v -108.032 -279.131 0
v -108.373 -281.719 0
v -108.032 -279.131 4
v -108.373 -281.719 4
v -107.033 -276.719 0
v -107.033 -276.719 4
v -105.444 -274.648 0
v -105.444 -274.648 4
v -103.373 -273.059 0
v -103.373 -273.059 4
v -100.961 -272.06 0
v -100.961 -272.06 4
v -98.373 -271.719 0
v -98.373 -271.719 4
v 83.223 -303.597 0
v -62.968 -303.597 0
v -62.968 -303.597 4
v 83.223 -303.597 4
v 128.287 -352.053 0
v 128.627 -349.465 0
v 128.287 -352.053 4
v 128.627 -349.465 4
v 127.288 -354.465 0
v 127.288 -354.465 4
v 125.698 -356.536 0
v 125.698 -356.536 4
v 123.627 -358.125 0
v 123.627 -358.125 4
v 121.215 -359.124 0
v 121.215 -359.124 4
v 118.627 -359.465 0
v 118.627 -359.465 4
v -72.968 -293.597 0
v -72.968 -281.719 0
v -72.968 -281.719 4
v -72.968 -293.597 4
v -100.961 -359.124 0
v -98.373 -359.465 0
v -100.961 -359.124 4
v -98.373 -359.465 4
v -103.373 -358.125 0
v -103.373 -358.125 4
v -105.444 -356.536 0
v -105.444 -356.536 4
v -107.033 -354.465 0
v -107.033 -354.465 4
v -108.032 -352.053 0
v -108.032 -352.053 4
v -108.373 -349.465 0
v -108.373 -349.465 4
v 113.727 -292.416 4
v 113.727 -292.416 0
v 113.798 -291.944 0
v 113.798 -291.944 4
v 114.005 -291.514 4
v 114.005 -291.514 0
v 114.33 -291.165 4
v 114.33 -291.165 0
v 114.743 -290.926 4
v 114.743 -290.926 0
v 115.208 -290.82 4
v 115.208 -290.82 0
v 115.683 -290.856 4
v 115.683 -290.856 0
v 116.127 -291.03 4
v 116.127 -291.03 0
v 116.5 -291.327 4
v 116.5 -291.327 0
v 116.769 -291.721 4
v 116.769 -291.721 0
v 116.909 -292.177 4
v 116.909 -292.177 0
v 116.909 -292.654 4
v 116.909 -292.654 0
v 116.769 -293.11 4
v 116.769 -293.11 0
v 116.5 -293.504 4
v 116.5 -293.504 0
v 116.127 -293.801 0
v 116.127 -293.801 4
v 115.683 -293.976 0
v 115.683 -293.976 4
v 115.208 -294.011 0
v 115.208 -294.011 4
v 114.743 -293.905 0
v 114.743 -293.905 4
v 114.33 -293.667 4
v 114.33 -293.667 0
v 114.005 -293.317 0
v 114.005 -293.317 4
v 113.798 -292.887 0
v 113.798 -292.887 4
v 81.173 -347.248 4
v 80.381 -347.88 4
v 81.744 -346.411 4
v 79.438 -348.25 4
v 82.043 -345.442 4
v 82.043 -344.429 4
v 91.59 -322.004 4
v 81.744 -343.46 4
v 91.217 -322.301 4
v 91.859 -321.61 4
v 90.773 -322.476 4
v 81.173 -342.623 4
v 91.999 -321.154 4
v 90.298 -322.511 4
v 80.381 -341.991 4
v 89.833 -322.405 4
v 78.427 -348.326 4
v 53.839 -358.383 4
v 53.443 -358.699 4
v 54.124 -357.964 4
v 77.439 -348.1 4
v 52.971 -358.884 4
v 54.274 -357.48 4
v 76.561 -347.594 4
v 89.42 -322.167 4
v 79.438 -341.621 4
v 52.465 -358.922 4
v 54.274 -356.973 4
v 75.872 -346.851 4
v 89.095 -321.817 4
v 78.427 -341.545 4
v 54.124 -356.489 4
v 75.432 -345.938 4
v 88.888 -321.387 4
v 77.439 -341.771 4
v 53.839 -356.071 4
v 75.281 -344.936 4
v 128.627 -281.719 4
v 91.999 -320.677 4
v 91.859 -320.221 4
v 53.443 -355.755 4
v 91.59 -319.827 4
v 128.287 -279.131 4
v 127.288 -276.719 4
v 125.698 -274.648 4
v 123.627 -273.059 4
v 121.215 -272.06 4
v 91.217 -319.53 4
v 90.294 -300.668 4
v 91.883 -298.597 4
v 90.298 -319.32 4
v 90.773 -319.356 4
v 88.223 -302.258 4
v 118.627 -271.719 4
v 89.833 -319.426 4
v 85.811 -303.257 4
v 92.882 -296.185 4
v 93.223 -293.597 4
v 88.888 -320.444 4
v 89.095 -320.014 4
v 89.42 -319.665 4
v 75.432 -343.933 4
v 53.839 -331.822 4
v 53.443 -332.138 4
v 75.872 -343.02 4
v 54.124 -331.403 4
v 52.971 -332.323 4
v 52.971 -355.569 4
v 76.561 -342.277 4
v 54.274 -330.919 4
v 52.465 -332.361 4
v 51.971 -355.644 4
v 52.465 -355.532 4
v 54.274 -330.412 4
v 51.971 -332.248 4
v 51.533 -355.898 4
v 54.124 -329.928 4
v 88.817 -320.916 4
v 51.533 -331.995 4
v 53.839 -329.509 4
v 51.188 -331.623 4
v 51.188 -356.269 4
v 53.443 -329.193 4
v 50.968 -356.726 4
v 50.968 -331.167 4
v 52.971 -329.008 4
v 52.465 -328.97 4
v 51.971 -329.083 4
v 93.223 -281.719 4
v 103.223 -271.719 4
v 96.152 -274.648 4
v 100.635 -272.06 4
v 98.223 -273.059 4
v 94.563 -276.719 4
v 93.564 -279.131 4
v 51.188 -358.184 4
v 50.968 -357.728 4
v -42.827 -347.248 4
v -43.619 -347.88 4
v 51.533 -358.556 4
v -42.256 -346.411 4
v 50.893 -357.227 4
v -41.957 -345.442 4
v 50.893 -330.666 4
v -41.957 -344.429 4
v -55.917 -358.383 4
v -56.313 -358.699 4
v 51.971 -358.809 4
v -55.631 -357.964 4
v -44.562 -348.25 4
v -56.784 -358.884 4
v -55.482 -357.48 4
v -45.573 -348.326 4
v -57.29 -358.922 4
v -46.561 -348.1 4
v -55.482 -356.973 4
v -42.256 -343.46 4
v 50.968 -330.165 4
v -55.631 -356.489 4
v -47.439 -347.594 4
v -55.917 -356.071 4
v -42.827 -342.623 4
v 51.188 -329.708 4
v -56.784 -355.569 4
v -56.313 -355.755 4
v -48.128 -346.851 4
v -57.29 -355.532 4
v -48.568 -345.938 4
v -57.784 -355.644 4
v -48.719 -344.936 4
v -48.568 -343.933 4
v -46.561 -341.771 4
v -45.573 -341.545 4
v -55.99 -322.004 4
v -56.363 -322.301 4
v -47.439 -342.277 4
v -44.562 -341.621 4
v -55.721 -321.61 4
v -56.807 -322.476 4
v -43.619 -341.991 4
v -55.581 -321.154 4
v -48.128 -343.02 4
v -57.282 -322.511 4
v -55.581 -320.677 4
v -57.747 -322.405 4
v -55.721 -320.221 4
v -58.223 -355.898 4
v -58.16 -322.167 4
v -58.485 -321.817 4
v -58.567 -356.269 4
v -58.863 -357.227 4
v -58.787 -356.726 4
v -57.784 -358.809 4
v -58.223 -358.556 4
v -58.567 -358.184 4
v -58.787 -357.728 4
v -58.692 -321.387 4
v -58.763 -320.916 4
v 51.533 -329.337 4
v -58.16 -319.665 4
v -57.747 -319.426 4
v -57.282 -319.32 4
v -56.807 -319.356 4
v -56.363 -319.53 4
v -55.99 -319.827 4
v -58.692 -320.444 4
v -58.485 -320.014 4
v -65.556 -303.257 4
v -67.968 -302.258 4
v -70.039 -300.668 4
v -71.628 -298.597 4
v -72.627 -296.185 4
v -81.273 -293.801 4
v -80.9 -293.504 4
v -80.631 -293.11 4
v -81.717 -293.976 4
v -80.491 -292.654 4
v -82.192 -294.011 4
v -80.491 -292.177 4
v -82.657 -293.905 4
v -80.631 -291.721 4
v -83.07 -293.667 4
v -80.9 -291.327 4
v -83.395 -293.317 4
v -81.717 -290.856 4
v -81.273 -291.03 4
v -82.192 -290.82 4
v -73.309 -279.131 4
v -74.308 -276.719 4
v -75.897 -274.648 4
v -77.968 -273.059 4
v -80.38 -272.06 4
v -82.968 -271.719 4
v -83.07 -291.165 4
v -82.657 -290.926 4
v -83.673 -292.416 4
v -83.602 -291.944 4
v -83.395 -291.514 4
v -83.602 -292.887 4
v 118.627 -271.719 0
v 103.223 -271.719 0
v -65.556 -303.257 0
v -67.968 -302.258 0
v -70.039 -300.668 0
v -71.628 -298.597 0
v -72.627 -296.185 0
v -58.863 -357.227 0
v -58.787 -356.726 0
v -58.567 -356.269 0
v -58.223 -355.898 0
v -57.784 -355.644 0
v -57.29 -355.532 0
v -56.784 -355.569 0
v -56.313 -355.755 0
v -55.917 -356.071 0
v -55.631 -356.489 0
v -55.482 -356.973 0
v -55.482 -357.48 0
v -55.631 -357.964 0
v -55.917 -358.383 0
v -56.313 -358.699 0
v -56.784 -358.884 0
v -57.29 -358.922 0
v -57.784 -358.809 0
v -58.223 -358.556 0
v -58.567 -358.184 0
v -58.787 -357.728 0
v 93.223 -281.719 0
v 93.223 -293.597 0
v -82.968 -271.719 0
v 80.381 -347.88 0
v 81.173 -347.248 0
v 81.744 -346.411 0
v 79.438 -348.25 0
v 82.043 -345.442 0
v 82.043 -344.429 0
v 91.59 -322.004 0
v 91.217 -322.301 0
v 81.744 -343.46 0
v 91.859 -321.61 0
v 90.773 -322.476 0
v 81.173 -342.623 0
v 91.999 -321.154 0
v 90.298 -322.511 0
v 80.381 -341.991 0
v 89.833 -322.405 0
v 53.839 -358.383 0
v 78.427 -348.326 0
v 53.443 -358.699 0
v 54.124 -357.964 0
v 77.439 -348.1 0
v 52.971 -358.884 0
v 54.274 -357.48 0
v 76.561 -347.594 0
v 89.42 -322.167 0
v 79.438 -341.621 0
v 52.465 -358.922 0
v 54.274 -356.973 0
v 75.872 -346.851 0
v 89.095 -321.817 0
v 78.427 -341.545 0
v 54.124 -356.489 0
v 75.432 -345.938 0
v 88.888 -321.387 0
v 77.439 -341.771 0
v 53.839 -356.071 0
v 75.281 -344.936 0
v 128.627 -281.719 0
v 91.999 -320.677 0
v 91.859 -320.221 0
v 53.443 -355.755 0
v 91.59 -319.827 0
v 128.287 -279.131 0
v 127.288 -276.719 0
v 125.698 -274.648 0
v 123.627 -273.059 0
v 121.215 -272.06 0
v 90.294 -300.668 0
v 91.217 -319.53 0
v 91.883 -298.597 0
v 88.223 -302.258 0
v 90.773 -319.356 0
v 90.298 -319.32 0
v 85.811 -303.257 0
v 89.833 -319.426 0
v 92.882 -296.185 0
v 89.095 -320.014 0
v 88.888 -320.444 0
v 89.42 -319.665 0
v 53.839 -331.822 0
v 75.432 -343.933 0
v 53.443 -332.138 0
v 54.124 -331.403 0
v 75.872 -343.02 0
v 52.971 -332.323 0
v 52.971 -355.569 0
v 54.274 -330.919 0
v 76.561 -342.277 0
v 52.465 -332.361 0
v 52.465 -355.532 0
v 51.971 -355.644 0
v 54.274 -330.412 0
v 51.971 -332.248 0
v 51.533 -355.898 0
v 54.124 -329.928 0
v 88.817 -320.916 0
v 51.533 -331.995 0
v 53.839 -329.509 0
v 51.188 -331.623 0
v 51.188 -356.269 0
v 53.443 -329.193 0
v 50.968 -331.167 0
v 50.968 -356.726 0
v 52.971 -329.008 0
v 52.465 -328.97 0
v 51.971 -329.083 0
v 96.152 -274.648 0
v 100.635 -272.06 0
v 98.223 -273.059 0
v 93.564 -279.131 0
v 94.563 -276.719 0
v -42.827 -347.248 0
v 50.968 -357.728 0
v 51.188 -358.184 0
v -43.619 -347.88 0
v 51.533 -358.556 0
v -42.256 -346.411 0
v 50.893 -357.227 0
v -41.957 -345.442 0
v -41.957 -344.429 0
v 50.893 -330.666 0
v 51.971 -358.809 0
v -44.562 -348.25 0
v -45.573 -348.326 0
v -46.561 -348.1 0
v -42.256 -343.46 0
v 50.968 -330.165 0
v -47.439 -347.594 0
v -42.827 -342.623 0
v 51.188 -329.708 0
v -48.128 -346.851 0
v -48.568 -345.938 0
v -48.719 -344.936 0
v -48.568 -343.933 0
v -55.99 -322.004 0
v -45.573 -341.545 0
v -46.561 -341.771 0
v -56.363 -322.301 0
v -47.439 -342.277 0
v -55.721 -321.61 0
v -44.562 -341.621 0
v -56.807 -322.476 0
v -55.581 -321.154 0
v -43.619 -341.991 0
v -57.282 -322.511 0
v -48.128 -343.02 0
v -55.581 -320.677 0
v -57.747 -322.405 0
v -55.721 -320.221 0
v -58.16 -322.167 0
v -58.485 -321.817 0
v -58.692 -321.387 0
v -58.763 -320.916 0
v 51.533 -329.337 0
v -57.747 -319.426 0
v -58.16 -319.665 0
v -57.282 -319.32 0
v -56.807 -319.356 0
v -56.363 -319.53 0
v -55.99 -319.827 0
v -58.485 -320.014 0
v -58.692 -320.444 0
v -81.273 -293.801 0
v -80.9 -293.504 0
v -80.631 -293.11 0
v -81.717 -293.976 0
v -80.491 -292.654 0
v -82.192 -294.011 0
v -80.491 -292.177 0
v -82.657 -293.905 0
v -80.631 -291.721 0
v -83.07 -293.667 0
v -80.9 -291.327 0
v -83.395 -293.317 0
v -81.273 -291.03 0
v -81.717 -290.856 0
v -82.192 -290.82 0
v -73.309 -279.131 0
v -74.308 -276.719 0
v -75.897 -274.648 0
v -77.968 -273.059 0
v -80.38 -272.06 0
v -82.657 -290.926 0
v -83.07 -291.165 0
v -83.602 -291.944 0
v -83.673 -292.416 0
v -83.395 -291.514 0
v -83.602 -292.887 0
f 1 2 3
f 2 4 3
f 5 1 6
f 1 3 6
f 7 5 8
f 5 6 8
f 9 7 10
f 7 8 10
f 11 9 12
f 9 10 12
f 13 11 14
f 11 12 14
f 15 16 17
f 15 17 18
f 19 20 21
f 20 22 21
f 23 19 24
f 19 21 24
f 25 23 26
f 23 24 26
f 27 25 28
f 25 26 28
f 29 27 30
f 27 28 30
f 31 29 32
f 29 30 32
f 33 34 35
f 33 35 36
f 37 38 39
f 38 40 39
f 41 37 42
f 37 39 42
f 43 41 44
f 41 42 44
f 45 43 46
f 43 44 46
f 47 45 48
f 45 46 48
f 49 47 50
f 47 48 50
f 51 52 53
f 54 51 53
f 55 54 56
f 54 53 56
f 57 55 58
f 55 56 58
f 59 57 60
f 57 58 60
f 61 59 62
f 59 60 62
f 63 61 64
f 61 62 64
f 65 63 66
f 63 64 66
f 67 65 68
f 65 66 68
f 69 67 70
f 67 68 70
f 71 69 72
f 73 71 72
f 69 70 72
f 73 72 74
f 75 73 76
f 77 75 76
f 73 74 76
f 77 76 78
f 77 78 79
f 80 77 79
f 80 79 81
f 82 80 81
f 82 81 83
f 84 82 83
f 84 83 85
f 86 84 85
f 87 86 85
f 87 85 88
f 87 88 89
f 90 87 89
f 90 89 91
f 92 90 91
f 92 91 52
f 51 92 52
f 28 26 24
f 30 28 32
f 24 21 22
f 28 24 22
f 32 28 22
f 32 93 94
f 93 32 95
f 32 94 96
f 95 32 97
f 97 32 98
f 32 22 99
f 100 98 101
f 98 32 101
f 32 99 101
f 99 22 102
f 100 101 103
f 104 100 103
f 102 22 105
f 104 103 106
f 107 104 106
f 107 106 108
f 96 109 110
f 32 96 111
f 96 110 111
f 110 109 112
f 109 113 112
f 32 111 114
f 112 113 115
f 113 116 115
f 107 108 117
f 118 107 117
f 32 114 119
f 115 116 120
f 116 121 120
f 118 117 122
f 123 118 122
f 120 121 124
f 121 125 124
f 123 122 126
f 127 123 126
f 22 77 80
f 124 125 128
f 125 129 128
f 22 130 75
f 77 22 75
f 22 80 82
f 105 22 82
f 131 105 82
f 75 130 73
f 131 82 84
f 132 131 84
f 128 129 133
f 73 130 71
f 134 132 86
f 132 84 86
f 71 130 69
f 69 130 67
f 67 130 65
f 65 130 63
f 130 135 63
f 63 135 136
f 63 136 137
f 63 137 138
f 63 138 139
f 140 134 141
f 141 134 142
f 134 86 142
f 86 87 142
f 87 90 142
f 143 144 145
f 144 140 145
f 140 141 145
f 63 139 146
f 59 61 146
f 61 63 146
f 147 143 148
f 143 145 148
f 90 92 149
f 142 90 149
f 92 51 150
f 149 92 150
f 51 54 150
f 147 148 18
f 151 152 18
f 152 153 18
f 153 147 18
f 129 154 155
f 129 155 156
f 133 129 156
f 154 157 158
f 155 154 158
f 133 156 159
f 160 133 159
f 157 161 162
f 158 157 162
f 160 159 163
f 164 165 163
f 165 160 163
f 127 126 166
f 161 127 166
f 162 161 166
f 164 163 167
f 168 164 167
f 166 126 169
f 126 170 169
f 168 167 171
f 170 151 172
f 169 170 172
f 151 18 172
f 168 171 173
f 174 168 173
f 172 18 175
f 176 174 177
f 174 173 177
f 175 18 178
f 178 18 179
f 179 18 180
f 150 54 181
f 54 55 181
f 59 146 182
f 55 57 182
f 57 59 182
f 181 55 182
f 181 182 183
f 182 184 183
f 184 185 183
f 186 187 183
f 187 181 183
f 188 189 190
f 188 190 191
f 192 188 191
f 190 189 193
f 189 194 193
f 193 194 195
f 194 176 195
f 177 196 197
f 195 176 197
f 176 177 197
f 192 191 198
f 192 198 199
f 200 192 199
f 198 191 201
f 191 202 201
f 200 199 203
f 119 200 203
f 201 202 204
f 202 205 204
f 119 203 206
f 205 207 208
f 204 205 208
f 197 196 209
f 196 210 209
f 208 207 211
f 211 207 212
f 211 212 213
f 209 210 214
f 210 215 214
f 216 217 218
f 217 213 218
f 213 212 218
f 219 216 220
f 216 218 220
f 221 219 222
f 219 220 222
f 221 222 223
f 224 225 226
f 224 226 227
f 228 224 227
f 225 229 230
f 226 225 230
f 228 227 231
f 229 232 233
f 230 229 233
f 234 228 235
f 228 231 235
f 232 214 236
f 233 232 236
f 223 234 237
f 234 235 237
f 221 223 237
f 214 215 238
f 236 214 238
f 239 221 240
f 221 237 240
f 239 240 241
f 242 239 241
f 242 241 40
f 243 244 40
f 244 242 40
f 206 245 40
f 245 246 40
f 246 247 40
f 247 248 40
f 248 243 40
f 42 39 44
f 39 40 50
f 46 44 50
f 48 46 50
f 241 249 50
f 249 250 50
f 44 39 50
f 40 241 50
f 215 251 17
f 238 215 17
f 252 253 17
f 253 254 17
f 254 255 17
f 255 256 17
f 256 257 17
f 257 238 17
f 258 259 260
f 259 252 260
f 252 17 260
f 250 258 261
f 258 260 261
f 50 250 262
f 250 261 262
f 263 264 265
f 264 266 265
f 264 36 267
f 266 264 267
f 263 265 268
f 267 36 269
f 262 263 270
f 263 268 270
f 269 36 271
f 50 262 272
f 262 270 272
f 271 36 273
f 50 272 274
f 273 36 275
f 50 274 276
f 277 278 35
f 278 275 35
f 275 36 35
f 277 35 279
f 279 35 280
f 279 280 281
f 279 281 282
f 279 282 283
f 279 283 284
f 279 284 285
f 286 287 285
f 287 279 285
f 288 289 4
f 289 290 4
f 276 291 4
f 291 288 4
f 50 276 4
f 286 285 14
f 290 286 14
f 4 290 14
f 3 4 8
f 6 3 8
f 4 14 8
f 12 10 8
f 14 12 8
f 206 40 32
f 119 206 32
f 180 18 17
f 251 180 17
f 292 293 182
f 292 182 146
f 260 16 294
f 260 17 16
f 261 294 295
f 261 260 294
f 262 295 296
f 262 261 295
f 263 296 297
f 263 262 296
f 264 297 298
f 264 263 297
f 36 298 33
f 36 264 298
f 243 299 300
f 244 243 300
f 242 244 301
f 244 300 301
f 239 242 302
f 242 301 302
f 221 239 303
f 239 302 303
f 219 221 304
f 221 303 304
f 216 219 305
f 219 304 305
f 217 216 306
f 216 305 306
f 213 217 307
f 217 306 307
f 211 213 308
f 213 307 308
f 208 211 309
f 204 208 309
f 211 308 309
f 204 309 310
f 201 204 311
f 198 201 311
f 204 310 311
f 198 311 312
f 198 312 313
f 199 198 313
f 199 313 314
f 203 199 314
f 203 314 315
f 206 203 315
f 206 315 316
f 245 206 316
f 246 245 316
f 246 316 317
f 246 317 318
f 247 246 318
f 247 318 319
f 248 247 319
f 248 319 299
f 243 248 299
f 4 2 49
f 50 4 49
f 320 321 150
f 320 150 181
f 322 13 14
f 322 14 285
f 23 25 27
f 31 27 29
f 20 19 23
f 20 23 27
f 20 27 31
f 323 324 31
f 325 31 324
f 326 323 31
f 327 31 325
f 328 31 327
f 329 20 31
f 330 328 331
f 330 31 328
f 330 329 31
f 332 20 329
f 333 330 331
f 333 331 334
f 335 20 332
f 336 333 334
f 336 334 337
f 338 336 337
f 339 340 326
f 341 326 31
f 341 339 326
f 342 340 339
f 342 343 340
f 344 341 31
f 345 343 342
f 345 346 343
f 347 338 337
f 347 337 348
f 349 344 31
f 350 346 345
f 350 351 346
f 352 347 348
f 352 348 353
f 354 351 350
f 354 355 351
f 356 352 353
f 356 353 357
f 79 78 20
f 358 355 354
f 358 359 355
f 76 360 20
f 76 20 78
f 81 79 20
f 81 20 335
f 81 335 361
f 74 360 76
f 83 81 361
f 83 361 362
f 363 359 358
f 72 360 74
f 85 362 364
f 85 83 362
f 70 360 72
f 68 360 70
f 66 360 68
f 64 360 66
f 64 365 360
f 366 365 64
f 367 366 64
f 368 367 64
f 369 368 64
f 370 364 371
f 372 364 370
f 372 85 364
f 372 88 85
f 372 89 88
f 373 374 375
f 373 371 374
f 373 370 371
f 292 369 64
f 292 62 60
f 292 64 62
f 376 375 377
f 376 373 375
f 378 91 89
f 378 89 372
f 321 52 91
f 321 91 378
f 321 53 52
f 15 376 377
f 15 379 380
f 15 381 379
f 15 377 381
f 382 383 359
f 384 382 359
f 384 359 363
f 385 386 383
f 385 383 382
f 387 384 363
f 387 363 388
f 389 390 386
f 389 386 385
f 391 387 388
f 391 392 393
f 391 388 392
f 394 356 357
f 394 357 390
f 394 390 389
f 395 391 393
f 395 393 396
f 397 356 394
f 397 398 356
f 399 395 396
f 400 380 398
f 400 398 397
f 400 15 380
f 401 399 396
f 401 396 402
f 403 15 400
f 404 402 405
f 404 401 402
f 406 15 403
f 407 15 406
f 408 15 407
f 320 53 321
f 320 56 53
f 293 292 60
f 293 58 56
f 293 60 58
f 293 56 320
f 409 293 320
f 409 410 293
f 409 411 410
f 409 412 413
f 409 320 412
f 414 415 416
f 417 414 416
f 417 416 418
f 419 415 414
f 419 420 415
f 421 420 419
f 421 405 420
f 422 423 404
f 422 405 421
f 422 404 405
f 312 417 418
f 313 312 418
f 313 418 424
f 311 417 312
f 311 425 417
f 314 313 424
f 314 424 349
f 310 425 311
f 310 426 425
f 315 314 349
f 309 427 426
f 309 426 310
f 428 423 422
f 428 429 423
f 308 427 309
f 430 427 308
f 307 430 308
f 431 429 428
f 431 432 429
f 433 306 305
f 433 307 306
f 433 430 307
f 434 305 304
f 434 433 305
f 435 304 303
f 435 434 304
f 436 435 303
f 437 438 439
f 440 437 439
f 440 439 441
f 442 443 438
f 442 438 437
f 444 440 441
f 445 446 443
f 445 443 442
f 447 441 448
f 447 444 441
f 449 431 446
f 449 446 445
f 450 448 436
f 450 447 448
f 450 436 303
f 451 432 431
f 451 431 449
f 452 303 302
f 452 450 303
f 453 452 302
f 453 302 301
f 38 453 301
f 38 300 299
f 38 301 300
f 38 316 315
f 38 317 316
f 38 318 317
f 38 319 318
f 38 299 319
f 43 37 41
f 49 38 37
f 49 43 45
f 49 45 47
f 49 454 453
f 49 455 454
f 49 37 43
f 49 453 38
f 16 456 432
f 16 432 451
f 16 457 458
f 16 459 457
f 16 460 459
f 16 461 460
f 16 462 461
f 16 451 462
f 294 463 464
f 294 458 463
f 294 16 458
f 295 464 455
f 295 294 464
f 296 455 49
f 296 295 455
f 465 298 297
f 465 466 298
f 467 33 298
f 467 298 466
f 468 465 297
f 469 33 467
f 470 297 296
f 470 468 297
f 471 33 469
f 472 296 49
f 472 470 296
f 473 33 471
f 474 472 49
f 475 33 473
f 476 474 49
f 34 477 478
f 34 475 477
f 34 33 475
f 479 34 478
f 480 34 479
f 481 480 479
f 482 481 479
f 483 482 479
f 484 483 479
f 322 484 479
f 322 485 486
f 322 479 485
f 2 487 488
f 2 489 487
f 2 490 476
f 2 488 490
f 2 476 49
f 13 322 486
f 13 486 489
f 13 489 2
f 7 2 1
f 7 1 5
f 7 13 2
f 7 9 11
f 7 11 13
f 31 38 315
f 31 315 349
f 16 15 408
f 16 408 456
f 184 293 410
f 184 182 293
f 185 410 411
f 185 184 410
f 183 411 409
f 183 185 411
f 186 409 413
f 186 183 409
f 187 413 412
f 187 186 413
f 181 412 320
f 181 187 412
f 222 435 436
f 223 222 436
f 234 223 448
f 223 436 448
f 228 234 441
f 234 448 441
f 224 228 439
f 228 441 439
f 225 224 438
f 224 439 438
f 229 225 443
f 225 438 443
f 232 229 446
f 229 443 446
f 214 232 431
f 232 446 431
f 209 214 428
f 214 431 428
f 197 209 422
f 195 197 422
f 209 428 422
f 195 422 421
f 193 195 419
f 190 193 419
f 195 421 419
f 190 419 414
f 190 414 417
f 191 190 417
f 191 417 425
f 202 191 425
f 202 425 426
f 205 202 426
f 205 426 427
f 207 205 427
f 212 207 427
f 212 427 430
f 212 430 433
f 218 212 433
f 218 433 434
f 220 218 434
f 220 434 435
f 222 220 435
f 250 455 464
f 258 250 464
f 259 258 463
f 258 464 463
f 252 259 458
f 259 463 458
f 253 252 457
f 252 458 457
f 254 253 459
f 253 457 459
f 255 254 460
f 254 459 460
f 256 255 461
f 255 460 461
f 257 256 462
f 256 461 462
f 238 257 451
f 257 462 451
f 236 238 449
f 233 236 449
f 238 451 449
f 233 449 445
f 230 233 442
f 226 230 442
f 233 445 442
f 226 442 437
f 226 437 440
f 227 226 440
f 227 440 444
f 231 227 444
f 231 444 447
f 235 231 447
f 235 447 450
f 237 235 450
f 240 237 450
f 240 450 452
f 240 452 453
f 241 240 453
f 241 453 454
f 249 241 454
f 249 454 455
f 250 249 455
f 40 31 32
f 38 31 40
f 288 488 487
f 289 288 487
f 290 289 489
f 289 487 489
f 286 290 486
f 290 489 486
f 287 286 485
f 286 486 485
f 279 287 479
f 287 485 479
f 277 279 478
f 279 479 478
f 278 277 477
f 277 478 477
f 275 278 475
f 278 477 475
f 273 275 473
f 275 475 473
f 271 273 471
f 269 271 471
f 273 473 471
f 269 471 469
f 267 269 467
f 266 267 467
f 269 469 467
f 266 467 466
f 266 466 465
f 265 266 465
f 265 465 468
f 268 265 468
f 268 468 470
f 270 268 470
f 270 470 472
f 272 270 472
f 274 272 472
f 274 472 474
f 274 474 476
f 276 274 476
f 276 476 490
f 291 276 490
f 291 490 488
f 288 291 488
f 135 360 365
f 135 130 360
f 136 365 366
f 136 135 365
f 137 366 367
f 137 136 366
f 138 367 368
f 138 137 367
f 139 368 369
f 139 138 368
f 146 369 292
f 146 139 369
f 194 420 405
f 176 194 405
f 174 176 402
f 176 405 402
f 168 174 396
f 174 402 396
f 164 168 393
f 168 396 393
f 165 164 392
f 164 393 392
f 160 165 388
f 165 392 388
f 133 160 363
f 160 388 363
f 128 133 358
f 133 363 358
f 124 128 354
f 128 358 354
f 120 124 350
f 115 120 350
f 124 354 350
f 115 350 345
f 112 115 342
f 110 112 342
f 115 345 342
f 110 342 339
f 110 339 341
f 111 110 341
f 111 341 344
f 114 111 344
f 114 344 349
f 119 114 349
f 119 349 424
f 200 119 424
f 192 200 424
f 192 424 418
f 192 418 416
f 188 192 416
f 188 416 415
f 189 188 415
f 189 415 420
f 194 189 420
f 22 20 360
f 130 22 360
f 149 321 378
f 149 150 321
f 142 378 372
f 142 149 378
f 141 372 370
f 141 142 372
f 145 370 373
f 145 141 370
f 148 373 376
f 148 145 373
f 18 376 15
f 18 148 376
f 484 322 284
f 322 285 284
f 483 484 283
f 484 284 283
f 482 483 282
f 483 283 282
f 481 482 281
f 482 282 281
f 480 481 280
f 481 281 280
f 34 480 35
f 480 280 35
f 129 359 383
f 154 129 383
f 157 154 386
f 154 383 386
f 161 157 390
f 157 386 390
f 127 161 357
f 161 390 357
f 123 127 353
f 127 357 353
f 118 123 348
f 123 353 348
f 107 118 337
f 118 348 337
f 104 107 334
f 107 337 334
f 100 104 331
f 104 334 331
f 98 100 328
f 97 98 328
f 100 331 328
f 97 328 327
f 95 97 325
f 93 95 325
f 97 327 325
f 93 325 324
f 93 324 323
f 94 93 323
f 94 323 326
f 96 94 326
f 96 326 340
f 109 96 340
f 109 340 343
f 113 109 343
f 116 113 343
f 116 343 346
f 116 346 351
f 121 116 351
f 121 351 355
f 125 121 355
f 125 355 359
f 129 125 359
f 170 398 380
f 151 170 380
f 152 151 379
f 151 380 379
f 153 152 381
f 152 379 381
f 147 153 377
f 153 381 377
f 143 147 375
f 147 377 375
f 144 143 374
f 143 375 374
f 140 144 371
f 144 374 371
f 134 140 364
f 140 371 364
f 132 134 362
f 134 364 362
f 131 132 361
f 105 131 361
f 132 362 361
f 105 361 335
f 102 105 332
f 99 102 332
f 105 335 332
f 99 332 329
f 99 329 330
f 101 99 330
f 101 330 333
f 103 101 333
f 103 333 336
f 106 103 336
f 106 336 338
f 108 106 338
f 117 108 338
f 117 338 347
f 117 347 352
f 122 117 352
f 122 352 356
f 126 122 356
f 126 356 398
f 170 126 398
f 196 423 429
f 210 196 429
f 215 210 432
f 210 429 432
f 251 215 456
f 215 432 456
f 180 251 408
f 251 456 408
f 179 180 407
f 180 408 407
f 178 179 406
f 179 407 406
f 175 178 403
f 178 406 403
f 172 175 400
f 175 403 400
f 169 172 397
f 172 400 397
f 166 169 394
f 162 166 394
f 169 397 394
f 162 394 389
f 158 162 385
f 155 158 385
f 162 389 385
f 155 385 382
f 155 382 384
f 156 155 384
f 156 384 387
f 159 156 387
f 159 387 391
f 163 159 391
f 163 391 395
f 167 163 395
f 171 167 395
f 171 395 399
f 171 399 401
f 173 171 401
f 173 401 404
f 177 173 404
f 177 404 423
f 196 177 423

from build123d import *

# Parameters (mm, degrees)
BOSS_EXTRUDE1_DEPTH     = 4
M3_CLEARANCE_HOLE1_D    = 3.2
FILLET1_R               = 10
TAP_DRILL_FOR_M8_TAP1_D = 6.8
M3_CLEARANCE_HOLE3_D    = 3.4


with BuildPart() as part:
    # Sketch1 → Boss-Extrude1 (new body)
    with BuildSketch(Plane.XY):
        Polygon((128.627293893, -305.665681156), (128.627293893, -359.464720764), (-108.372706107, -359.464720764), (-108.372706107, -305.665681156), (-108.372706107, -271.718782294), (-72.968170503, -271.718782294), (-72.968170503, -303.597286204), (93.222758289, -303.597286204), (93.222758289, -271.718782294), (128.627293893, -271.718782294), align=None)
    extrude(amount=BOSS_EXTRUDE1_DEPTH)

    # M3 Clearance Hole1 (through all)
    with Locations(Plane.XY.offset(4)):
        with Locations((-82.072706107, -292.415681156), (115.327293893, -292.415681156), (90.417293893, -320.915681156), (-57.162706107, -320.915681156)):
            Hole(M3_CLEARANCE_HOLE1_D / 2)

    # Fillet1
    fillet1_edges = [part.edges().sort_by_distance(p)[0] for p in [
        (128.627293893, -359.464720764, 2),
        (-108.372706107, -359.464720764, 2),
        (-108.372706107, -271.718782294, 2),
        (-72.968170503, -271.718782294, 2),
        (-72.968170503, -303.597286204, 2),
        (93.222758289, -303.597286204, 2),
        (93.222758289, -271.718782294, 2),
        (128.627293893, -271.718782294, 2),
    ]]
    fillet(fillet1_edges, radius=FILLET1_R)

    # Tap Drill for M8 Tap1 (through all)
    with Locations(Plane.XY.offset(4)):
        with Locations((78.681014792, -344.935502047), (-45.318985208, -344.935502047)):
            Hole(TAP_DRILL_FOR_M8_TAP1_D / 2)

    # M3 Clearance Hole3 (through all)
    with Locations(Plane.XY.offset(4)):
        with Locations((52.592509681, -330.665681156), (52.592509681, -357.226830961), (-57.162706107, -357.226830961)):
            Hole(M3_CLEARANCE_HOLE3_D / 2)


solid = part.part
